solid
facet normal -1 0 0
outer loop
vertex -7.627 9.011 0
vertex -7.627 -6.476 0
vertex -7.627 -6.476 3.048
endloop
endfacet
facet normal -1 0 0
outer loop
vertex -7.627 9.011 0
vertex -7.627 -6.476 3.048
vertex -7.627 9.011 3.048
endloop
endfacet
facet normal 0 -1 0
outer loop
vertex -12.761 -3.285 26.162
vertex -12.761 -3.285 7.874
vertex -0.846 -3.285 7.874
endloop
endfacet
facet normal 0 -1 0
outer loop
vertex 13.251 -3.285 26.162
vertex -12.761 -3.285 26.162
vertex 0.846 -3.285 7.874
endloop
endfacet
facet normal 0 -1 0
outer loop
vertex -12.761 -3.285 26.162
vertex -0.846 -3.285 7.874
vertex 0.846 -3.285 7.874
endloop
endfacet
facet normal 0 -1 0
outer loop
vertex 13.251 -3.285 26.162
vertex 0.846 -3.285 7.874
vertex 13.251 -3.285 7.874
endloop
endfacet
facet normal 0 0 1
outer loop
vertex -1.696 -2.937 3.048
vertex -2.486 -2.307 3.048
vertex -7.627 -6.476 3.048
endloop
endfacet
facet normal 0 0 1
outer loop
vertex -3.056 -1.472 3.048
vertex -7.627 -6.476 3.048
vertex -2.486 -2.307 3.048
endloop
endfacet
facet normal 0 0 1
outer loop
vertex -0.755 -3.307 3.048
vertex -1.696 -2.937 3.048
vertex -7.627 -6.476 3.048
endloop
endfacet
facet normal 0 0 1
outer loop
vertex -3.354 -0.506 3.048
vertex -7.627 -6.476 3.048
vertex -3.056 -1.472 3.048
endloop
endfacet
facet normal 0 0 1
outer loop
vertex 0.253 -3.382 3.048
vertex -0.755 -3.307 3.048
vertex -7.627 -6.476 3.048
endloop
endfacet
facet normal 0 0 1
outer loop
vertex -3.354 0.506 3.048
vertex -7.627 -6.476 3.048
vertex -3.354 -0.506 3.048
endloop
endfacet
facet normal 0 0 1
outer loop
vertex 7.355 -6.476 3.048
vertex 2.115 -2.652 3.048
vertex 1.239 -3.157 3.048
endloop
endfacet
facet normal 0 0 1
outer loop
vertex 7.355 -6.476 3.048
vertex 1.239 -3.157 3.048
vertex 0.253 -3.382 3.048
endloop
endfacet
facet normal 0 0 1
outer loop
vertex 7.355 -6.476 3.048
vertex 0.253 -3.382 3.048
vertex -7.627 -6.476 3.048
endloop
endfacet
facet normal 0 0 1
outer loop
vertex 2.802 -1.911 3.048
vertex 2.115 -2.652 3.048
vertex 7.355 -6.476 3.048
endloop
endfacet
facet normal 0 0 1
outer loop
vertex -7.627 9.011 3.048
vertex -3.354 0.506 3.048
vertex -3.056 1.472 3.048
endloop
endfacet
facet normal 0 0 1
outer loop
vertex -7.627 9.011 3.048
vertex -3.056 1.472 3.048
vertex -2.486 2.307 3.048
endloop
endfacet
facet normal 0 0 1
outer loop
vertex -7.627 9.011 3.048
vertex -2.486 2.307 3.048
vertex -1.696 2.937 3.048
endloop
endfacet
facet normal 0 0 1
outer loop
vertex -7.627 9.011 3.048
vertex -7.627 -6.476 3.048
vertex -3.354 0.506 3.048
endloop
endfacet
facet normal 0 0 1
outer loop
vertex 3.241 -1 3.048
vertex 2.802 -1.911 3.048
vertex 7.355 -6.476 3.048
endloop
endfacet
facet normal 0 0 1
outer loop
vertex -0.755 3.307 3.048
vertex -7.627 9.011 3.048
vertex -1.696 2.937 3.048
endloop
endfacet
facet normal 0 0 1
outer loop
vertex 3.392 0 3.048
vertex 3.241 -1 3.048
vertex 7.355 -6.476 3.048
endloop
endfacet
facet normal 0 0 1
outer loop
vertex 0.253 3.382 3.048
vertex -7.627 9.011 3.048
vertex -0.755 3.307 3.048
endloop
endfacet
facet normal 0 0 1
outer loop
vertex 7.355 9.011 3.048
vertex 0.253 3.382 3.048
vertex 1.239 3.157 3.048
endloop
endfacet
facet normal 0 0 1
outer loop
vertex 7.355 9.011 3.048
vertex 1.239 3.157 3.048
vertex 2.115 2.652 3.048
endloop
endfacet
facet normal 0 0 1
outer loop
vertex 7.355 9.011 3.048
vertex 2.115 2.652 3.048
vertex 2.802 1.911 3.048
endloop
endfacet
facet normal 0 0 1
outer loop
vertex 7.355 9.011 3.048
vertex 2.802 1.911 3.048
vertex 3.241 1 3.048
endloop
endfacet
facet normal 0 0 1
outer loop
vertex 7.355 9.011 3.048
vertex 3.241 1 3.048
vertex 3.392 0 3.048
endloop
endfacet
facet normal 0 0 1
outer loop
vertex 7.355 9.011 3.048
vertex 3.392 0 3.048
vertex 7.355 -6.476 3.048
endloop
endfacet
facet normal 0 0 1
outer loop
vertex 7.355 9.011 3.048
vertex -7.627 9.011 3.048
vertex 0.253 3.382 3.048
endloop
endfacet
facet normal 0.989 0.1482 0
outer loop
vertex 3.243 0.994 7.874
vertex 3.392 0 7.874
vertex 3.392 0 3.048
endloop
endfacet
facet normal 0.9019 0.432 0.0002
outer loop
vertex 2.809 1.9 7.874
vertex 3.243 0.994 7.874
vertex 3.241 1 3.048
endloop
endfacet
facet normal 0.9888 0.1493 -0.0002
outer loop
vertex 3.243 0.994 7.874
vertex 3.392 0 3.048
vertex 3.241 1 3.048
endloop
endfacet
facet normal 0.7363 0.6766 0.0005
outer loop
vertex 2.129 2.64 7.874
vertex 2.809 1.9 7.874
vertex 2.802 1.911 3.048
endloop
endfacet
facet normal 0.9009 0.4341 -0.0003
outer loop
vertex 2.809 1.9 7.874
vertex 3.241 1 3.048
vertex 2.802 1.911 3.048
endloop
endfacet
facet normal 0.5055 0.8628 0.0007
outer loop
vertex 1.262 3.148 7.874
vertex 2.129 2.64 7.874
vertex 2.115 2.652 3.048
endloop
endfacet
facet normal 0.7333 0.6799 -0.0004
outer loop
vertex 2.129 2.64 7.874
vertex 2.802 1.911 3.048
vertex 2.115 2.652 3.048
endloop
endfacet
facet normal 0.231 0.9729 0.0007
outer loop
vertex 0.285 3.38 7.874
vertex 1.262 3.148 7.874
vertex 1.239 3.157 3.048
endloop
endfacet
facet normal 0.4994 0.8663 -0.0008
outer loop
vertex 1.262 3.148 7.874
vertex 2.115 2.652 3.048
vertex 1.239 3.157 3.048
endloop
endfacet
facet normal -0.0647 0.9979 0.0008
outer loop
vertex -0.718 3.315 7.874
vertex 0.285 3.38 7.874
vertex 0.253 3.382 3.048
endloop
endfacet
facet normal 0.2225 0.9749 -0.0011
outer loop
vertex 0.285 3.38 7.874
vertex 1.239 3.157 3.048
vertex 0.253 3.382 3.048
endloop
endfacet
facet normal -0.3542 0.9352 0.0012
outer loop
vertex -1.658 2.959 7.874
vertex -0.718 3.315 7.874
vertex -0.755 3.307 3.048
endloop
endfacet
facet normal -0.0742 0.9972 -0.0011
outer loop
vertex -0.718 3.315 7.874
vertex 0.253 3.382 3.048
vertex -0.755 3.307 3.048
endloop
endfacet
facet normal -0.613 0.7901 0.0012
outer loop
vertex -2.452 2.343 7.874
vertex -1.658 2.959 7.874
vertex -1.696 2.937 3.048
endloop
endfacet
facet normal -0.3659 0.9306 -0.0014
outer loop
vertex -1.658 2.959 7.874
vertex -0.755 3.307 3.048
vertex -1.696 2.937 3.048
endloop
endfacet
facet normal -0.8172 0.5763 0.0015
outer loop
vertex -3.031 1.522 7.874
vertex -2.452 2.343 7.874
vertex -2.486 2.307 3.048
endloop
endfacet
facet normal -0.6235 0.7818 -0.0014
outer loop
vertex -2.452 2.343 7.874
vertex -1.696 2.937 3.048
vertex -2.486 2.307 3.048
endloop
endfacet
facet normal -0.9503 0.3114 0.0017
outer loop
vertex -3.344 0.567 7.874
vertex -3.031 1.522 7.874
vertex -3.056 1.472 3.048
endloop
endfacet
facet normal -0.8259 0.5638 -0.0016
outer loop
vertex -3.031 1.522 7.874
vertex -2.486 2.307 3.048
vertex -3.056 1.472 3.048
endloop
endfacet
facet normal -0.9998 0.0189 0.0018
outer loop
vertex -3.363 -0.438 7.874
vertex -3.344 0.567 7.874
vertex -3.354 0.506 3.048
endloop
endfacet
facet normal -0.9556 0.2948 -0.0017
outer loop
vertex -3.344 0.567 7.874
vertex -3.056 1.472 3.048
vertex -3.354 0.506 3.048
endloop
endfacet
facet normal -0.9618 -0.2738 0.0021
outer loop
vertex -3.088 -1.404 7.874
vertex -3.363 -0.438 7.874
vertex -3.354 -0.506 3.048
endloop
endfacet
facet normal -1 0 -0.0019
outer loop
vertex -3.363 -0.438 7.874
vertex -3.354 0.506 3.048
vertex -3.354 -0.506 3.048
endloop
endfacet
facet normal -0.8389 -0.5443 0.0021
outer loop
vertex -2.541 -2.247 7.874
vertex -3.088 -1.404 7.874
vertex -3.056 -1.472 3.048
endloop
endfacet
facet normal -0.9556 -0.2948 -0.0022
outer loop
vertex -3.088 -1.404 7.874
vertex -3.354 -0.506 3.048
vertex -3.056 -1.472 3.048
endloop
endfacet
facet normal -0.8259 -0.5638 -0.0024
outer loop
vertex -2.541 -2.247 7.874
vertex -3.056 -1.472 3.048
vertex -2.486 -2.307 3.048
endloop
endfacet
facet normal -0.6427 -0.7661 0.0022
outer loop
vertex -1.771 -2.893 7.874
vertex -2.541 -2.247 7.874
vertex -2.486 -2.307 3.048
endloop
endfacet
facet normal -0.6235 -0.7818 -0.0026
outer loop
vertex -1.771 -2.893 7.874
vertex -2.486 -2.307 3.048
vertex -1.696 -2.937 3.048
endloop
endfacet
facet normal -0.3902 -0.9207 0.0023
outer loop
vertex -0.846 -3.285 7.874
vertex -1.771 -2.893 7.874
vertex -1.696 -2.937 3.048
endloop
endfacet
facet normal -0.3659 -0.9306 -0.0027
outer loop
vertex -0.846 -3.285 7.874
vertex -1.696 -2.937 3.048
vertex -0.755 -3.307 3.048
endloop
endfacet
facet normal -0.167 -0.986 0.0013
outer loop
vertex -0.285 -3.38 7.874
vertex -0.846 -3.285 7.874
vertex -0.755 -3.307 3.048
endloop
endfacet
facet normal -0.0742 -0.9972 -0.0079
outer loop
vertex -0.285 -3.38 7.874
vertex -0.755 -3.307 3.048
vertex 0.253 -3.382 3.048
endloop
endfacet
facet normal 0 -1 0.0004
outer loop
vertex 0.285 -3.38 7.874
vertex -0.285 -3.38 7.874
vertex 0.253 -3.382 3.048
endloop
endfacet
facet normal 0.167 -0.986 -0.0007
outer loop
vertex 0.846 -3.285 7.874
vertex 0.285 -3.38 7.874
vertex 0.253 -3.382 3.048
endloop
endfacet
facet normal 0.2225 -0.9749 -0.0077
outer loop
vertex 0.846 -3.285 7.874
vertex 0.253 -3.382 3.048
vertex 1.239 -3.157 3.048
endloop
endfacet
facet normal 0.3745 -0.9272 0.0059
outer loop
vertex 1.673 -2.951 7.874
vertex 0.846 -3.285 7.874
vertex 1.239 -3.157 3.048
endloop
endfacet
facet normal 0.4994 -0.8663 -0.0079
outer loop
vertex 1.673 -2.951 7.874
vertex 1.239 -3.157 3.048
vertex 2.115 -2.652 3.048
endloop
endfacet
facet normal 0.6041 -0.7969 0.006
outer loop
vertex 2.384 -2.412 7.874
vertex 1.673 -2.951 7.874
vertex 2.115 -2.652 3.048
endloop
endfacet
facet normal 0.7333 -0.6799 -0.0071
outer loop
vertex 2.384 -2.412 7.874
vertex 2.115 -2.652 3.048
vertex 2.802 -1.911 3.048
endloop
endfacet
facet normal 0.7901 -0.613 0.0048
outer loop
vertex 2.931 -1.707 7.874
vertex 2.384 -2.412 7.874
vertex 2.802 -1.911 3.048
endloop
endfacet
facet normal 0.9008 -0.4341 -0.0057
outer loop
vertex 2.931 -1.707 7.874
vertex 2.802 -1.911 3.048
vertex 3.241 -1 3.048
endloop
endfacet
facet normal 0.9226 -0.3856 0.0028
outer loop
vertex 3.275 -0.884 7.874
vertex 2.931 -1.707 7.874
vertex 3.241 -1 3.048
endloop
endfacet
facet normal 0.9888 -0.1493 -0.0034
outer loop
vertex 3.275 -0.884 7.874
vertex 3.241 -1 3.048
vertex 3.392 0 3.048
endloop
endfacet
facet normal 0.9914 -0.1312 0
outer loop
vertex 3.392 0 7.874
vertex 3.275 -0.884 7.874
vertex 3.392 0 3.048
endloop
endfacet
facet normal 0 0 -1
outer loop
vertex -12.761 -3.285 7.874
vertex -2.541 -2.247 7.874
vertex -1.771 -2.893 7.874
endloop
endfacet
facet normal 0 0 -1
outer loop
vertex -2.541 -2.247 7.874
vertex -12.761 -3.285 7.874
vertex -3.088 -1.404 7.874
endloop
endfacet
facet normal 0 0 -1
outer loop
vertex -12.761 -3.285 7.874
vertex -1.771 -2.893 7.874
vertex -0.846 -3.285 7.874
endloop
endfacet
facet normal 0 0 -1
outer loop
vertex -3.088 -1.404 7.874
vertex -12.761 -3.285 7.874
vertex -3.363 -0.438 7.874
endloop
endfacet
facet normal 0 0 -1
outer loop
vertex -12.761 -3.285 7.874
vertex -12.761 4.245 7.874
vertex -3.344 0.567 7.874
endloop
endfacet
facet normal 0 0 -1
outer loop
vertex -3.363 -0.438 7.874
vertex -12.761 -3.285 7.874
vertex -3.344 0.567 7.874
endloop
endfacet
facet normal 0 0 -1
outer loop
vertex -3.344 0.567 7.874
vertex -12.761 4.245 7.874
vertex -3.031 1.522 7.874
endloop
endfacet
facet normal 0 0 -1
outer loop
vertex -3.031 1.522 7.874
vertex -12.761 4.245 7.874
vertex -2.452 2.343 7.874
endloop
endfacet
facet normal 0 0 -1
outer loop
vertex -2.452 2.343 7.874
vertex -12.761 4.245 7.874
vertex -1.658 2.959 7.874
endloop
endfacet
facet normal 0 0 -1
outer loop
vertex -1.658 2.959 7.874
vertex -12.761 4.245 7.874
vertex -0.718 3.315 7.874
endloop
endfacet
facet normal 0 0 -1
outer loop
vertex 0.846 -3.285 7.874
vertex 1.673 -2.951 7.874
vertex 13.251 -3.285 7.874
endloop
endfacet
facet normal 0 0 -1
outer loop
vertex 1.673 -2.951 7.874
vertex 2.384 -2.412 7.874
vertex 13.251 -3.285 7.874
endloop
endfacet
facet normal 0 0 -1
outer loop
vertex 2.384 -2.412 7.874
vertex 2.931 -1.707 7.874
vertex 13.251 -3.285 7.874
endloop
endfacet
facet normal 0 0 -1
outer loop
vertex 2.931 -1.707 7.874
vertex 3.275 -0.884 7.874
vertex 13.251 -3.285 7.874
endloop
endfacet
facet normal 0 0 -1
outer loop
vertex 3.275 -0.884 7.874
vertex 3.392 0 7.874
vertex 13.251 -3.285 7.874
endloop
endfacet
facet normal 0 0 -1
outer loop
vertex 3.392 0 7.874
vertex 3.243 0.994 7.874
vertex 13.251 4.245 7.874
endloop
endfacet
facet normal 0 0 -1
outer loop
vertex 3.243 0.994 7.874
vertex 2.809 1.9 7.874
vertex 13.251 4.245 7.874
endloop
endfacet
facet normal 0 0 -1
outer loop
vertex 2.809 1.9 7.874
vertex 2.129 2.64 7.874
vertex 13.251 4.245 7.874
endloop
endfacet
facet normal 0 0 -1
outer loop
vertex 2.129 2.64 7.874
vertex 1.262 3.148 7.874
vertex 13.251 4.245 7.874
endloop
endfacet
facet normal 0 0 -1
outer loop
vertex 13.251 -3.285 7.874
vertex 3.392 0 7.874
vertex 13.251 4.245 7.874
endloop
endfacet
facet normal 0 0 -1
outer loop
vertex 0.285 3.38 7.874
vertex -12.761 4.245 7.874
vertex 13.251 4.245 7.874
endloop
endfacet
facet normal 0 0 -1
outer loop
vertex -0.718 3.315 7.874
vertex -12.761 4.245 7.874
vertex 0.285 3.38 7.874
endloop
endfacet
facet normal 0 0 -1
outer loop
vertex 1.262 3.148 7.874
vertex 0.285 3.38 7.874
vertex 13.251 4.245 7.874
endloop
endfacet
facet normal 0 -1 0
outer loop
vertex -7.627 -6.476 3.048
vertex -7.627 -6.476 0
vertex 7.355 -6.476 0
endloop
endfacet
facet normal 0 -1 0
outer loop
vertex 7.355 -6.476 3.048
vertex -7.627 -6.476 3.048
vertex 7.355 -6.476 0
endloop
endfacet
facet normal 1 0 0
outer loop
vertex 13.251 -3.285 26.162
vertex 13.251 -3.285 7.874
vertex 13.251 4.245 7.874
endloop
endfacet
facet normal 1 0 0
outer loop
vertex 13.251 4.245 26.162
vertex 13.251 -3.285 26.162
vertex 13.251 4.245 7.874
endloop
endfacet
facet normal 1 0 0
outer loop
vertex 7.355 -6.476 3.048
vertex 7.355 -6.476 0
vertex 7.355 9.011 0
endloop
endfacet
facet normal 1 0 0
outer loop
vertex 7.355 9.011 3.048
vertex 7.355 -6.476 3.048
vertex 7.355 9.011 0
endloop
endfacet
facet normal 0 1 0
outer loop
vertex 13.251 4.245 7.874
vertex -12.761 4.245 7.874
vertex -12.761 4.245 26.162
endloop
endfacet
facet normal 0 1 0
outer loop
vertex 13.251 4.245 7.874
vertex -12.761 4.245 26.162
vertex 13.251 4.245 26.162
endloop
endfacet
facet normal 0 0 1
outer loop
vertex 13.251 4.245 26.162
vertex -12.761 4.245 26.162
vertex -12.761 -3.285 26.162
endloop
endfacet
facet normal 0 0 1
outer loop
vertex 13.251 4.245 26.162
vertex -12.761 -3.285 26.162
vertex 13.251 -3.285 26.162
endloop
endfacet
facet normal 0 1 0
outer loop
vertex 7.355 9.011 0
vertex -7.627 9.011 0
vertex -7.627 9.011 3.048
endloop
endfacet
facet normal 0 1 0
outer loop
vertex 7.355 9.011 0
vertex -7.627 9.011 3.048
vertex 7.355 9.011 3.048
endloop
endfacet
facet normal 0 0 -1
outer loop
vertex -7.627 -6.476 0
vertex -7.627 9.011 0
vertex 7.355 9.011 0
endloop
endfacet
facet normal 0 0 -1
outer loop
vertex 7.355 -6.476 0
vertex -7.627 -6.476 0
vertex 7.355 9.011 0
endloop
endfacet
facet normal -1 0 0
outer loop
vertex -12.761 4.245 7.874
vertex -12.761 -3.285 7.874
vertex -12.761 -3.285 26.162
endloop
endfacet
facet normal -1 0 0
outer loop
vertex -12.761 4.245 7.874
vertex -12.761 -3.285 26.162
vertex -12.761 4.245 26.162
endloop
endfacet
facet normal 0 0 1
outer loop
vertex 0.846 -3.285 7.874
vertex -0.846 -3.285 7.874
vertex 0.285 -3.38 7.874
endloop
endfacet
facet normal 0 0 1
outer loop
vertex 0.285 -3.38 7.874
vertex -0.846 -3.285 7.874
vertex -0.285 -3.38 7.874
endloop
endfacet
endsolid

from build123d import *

# Parameters (mm, degrees)
F0_W     = 14.981428
F0_H     = 15.487057
F1_DEPTH = 3.048
F2_R     = 3.391828
F3_DEPTH = 7.874
F4_W     = 26.01181
F4_H     = 7.529734
F5_DEPTH = 18.288


with BuildPart() as f1:
    # F0 (on Top) → F1 (new body)
    with BuildSketch(Plane.XY):
        with Locations((-0.136139, 1.267898)):
            Rectangle(F0_W, F0_H)
    extrude(amount=F1_DEPTH)

    # F2 (on Top) → F3 (join)
    with BuildSketch(Plane.XY):
        Circle(F2_R)
    extrude(amount=F3_DEPTH)

    # F4 (on face) → F5 (join)
    with BuildSketch(Plane.XY.offset(7.874)):
        with Locations((0.244767, 0.48016)):
            Rectangle(F4_W, F4_H)
    extrude(amount=F5_DEPTH)


solid = f1.part
